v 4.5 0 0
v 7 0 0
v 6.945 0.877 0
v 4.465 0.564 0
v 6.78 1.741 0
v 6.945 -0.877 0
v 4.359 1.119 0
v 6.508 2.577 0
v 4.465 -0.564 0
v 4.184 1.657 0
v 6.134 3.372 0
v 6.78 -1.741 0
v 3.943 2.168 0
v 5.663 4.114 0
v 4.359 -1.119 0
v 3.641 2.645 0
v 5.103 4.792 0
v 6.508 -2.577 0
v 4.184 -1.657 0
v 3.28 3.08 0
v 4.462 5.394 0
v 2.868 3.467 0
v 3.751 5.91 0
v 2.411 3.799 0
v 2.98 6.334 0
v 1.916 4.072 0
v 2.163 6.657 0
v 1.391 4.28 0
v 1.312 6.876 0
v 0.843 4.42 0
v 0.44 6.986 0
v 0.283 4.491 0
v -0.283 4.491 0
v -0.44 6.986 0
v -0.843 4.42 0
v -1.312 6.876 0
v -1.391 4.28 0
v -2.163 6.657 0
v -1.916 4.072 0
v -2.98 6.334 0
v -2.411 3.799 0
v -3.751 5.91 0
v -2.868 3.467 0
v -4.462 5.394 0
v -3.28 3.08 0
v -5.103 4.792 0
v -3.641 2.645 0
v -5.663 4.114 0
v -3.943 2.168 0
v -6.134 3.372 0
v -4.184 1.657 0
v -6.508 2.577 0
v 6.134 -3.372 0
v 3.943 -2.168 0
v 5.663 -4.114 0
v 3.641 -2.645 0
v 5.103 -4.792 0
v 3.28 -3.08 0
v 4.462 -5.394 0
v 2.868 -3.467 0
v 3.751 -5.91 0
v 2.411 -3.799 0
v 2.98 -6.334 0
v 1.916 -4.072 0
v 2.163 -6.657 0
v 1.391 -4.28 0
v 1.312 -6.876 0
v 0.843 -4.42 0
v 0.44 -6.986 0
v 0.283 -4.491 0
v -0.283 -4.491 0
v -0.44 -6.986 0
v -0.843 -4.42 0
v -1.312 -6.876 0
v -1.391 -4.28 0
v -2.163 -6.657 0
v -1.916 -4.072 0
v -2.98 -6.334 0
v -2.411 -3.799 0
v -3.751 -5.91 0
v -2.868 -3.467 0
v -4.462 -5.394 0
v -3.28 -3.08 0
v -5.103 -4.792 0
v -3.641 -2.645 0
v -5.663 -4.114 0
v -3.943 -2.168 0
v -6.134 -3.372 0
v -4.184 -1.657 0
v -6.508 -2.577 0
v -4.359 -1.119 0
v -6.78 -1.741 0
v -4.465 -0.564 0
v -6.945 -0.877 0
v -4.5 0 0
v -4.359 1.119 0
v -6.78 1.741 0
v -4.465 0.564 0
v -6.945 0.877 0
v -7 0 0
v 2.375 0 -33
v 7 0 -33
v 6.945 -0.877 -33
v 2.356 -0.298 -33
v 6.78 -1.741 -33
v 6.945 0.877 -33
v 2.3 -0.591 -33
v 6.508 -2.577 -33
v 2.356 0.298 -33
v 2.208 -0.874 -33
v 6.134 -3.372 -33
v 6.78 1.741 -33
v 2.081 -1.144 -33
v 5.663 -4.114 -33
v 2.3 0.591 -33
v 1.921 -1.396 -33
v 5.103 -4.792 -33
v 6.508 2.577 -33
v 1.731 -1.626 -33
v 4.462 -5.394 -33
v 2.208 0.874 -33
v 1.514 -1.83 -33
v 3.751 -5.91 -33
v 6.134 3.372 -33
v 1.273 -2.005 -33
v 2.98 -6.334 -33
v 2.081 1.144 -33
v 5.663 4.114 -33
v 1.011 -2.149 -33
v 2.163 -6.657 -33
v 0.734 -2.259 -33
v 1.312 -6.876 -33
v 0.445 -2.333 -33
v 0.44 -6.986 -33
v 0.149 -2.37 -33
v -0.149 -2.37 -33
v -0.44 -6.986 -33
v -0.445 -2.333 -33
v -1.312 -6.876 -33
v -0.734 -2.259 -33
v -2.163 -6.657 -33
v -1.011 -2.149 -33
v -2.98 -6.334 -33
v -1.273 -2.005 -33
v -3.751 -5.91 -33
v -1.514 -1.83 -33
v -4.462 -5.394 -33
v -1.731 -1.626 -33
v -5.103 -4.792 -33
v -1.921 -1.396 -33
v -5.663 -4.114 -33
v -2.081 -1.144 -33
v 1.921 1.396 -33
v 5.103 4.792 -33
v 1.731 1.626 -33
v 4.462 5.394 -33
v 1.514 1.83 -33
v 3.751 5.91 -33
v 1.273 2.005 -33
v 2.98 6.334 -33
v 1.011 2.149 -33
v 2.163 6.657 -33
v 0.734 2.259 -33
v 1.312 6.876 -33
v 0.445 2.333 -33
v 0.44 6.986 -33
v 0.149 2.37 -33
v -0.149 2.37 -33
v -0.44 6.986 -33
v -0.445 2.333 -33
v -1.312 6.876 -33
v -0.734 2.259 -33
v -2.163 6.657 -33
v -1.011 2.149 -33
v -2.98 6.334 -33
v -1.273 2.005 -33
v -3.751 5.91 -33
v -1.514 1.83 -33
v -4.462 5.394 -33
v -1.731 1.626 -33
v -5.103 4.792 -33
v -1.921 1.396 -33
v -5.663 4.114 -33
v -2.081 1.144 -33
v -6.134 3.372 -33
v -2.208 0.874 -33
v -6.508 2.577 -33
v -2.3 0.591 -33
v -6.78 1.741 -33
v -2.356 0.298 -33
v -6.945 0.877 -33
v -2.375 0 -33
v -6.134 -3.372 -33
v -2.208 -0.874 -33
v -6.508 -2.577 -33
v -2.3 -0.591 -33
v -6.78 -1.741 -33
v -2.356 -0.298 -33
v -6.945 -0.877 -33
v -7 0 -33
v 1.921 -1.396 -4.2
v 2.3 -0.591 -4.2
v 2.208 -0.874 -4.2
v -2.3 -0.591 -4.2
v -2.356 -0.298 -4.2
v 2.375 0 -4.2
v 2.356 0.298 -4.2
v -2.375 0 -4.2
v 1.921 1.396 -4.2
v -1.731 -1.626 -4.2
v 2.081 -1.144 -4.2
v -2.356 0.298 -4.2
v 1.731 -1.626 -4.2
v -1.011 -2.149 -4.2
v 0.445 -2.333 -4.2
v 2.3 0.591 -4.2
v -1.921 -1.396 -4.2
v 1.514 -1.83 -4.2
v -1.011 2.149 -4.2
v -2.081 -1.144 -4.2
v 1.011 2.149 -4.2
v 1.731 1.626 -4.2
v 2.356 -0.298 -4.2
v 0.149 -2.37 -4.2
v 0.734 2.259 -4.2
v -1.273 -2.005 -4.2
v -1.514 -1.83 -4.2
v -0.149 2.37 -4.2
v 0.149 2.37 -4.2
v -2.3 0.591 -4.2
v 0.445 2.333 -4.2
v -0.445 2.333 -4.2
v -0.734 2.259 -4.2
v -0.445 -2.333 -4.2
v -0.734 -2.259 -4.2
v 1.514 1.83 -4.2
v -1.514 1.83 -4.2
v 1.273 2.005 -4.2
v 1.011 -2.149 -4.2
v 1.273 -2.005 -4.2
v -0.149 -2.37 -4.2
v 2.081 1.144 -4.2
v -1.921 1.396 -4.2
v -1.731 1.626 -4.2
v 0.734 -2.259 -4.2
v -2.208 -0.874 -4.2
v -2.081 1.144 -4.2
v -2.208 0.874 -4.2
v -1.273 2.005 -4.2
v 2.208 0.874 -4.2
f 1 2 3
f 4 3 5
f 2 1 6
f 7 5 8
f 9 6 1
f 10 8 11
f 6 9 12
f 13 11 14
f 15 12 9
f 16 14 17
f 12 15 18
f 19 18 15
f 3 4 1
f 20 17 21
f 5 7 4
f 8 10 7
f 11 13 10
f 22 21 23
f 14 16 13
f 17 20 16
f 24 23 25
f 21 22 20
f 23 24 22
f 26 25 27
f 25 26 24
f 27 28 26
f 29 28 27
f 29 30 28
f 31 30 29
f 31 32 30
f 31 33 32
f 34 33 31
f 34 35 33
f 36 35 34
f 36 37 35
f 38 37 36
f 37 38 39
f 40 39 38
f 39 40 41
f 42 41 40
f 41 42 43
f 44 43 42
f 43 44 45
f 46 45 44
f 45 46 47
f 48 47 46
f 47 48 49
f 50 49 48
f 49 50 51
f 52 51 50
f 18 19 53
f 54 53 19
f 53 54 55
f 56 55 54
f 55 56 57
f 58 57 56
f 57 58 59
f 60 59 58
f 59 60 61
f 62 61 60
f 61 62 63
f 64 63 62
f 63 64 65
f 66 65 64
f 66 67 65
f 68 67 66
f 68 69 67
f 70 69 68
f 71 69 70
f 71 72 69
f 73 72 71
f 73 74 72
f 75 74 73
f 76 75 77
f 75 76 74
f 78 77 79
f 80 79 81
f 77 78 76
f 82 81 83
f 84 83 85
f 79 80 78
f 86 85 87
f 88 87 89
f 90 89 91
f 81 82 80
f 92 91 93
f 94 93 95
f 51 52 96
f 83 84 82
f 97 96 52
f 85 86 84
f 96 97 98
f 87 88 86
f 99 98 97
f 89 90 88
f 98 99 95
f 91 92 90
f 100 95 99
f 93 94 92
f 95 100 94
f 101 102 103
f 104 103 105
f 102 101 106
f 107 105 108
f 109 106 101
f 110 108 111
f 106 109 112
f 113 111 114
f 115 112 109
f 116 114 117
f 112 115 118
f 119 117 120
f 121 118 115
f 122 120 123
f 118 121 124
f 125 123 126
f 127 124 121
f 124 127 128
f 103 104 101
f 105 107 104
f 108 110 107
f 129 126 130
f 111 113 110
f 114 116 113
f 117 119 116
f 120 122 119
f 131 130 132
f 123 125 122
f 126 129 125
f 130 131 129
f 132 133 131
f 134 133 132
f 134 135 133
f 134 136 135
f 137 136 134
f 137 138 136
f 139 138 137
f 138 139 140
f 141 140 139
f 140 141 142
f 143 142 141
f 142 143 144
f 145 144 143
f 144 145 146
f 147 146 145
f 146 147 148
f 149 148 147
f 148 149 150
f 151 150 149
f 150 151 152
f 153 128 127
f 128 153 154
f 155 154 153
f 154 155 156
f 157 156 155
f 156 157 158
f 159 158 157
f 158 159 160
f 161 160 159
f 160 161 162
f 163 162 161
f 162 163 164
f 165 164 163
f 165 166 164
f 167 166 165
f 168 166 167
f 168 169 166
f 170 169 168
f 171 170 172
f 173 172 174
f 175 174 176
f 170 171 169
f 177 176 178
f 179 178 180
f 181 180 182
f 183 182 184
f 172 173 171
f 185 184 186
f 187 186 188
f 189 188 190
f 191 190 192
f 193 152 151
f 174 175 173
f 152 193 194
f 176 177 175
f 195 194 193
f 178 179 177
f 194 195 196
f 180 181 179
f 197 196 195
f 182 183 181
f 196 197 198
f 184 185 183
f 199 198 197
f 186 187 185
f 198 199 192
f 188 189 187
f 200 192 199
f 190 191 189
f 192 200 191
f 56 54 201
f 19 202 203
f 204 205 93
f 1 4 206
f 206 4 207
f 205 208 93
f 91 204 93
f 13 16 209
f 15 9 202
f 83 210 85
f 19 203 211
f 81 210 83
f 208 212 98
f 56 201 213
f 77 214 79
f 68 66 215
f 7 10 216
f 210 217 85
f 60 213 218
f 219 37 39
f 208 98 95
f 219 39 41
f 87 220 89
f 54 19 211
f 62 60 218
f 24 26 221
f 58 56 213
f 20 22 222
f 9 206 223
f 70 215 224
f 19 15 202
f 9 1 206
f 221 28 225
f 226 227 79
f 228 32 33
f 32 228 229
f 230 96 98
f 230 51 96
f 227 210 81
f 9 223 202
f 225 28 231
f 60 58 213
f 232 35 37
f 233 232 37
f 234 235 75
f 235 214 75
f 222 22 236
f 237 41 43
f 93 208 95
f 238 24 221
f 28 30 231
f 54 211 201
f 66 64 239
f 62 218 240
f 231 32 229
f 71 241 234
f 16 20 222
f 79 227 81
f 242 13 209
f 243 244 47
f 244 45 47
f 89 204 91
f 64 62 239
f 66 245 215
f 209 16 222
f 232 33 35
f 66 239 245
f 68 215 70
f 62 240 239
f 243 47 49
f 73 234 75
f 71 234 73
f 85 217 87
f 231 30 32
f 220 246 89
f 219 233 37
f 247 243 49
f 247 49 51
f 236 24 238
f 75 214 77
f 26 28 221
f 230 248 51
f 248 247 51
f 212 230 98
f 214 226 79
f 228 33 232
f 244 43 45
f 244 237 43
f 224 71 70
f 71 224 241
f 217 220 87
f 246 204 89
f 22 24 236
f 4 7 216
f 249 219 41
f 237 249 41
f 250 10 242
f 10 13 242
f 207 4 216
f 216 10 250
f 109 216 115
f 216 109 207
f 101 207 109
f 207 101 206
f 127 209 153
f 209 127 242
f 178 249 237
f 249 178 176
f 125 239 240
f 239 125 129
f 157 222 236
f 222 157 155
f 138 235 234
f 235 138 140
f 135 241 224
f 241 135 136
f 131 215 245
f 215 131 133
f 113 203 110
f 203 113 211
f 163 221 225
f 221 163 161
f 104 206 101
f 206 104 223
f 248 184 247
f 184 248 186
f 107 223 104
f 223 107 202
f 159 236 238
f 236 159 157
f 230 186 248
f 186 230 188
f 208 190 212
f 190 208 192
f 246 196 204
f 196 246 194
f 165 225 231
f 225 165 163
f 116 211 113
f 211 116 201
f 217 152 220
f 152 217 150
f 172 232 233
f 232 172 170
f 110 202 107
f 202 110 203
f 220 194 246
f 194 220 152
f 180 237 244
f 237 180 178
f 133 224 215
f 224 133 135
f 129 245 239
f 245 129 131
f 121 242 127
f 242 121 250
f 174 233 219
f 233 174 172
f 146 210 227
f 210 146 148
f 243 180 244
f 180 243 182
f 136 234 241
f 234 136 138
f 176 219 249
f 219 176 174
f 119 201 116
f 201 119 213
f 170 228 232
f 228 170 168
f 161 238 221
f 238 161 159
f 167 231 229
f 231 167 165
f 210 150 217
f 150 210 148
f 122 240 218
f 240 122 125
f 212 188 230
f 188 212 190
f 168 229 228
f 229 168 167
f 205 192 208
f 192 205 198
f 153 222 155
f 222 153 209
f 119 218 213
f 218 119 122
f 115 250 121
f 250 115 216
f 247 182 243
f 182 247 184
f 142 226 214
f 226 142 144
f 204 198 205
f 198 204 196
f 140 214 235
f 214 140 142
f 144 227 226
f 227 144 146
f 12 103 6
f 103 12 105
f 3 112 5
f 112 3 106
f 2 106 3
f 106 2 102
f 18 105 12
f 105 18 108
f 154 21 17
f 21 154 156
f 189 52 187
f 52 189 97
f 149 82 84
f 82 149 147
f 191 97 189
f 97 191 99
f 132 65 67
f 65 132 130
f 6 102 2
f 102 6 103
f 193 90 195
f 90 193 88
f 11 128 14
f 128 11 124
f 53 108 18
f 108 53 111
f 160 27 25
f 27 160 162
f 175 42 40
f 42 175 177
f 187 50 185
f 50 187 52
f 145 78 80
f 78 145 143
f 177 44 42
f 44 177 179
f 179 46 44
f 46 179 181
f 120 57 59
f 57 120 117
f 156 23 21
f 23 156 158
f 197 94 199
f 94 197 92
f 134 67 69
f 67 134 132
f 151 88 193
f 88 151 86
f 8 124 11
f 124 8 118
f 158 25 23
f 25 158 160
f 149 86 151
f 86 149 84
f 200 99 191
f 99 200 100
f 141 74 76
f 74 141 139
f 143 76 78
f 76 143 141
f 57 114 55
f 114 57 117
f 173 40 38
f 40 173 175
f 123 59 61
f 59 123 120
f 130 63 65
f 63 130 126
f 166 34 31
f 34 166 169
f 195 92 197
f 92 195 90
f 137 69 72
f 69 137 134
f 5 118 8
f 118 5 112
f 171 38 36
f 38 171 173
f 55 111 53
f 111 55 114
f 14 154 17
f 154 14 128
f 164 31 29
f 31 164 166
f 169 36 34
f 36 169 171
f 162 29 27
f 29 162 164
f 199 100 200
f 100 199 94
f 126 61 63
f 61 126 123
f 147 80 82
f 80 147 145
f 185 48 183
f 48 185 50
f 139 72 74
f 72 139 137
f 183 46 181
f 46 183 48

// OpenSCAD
$fn = 50;


difference() {
	union() {
		translate(v = [0, 0, -33.0000000000]) {
			cylinder(h = 33, r = 7.0000000000);
		}
		cylinder(h = 0, r = 17.0000000000);
	}
	union() {
		translate(v = [0, 0, 0]) {
			rotate(a = [0, 0, 0]) {
				difference() {
					union() {
						#translate(v = [0, 0, -33.0000000000]) {
							cylinder(h = 33, r = 2.2500000000);
						}
						#translate(v = [0, 0, -4.2000000000]) {
							cylinder(h = 4.2000000000, r = 7.0000000000, r1 = 2.3750000000, r2 = 4.5000000000);
						}
						#translate(v = [0, 0, -33.0000000000]) {
							cylinder(h = 33, r = 2.3750000000);
						}
						#translate(v = [0, 0, -33.0000000000]) {
							cylinder(h = 33, r = 2.2500000000);
						}
					}
					union();
				}
			}
		}
	}
}
